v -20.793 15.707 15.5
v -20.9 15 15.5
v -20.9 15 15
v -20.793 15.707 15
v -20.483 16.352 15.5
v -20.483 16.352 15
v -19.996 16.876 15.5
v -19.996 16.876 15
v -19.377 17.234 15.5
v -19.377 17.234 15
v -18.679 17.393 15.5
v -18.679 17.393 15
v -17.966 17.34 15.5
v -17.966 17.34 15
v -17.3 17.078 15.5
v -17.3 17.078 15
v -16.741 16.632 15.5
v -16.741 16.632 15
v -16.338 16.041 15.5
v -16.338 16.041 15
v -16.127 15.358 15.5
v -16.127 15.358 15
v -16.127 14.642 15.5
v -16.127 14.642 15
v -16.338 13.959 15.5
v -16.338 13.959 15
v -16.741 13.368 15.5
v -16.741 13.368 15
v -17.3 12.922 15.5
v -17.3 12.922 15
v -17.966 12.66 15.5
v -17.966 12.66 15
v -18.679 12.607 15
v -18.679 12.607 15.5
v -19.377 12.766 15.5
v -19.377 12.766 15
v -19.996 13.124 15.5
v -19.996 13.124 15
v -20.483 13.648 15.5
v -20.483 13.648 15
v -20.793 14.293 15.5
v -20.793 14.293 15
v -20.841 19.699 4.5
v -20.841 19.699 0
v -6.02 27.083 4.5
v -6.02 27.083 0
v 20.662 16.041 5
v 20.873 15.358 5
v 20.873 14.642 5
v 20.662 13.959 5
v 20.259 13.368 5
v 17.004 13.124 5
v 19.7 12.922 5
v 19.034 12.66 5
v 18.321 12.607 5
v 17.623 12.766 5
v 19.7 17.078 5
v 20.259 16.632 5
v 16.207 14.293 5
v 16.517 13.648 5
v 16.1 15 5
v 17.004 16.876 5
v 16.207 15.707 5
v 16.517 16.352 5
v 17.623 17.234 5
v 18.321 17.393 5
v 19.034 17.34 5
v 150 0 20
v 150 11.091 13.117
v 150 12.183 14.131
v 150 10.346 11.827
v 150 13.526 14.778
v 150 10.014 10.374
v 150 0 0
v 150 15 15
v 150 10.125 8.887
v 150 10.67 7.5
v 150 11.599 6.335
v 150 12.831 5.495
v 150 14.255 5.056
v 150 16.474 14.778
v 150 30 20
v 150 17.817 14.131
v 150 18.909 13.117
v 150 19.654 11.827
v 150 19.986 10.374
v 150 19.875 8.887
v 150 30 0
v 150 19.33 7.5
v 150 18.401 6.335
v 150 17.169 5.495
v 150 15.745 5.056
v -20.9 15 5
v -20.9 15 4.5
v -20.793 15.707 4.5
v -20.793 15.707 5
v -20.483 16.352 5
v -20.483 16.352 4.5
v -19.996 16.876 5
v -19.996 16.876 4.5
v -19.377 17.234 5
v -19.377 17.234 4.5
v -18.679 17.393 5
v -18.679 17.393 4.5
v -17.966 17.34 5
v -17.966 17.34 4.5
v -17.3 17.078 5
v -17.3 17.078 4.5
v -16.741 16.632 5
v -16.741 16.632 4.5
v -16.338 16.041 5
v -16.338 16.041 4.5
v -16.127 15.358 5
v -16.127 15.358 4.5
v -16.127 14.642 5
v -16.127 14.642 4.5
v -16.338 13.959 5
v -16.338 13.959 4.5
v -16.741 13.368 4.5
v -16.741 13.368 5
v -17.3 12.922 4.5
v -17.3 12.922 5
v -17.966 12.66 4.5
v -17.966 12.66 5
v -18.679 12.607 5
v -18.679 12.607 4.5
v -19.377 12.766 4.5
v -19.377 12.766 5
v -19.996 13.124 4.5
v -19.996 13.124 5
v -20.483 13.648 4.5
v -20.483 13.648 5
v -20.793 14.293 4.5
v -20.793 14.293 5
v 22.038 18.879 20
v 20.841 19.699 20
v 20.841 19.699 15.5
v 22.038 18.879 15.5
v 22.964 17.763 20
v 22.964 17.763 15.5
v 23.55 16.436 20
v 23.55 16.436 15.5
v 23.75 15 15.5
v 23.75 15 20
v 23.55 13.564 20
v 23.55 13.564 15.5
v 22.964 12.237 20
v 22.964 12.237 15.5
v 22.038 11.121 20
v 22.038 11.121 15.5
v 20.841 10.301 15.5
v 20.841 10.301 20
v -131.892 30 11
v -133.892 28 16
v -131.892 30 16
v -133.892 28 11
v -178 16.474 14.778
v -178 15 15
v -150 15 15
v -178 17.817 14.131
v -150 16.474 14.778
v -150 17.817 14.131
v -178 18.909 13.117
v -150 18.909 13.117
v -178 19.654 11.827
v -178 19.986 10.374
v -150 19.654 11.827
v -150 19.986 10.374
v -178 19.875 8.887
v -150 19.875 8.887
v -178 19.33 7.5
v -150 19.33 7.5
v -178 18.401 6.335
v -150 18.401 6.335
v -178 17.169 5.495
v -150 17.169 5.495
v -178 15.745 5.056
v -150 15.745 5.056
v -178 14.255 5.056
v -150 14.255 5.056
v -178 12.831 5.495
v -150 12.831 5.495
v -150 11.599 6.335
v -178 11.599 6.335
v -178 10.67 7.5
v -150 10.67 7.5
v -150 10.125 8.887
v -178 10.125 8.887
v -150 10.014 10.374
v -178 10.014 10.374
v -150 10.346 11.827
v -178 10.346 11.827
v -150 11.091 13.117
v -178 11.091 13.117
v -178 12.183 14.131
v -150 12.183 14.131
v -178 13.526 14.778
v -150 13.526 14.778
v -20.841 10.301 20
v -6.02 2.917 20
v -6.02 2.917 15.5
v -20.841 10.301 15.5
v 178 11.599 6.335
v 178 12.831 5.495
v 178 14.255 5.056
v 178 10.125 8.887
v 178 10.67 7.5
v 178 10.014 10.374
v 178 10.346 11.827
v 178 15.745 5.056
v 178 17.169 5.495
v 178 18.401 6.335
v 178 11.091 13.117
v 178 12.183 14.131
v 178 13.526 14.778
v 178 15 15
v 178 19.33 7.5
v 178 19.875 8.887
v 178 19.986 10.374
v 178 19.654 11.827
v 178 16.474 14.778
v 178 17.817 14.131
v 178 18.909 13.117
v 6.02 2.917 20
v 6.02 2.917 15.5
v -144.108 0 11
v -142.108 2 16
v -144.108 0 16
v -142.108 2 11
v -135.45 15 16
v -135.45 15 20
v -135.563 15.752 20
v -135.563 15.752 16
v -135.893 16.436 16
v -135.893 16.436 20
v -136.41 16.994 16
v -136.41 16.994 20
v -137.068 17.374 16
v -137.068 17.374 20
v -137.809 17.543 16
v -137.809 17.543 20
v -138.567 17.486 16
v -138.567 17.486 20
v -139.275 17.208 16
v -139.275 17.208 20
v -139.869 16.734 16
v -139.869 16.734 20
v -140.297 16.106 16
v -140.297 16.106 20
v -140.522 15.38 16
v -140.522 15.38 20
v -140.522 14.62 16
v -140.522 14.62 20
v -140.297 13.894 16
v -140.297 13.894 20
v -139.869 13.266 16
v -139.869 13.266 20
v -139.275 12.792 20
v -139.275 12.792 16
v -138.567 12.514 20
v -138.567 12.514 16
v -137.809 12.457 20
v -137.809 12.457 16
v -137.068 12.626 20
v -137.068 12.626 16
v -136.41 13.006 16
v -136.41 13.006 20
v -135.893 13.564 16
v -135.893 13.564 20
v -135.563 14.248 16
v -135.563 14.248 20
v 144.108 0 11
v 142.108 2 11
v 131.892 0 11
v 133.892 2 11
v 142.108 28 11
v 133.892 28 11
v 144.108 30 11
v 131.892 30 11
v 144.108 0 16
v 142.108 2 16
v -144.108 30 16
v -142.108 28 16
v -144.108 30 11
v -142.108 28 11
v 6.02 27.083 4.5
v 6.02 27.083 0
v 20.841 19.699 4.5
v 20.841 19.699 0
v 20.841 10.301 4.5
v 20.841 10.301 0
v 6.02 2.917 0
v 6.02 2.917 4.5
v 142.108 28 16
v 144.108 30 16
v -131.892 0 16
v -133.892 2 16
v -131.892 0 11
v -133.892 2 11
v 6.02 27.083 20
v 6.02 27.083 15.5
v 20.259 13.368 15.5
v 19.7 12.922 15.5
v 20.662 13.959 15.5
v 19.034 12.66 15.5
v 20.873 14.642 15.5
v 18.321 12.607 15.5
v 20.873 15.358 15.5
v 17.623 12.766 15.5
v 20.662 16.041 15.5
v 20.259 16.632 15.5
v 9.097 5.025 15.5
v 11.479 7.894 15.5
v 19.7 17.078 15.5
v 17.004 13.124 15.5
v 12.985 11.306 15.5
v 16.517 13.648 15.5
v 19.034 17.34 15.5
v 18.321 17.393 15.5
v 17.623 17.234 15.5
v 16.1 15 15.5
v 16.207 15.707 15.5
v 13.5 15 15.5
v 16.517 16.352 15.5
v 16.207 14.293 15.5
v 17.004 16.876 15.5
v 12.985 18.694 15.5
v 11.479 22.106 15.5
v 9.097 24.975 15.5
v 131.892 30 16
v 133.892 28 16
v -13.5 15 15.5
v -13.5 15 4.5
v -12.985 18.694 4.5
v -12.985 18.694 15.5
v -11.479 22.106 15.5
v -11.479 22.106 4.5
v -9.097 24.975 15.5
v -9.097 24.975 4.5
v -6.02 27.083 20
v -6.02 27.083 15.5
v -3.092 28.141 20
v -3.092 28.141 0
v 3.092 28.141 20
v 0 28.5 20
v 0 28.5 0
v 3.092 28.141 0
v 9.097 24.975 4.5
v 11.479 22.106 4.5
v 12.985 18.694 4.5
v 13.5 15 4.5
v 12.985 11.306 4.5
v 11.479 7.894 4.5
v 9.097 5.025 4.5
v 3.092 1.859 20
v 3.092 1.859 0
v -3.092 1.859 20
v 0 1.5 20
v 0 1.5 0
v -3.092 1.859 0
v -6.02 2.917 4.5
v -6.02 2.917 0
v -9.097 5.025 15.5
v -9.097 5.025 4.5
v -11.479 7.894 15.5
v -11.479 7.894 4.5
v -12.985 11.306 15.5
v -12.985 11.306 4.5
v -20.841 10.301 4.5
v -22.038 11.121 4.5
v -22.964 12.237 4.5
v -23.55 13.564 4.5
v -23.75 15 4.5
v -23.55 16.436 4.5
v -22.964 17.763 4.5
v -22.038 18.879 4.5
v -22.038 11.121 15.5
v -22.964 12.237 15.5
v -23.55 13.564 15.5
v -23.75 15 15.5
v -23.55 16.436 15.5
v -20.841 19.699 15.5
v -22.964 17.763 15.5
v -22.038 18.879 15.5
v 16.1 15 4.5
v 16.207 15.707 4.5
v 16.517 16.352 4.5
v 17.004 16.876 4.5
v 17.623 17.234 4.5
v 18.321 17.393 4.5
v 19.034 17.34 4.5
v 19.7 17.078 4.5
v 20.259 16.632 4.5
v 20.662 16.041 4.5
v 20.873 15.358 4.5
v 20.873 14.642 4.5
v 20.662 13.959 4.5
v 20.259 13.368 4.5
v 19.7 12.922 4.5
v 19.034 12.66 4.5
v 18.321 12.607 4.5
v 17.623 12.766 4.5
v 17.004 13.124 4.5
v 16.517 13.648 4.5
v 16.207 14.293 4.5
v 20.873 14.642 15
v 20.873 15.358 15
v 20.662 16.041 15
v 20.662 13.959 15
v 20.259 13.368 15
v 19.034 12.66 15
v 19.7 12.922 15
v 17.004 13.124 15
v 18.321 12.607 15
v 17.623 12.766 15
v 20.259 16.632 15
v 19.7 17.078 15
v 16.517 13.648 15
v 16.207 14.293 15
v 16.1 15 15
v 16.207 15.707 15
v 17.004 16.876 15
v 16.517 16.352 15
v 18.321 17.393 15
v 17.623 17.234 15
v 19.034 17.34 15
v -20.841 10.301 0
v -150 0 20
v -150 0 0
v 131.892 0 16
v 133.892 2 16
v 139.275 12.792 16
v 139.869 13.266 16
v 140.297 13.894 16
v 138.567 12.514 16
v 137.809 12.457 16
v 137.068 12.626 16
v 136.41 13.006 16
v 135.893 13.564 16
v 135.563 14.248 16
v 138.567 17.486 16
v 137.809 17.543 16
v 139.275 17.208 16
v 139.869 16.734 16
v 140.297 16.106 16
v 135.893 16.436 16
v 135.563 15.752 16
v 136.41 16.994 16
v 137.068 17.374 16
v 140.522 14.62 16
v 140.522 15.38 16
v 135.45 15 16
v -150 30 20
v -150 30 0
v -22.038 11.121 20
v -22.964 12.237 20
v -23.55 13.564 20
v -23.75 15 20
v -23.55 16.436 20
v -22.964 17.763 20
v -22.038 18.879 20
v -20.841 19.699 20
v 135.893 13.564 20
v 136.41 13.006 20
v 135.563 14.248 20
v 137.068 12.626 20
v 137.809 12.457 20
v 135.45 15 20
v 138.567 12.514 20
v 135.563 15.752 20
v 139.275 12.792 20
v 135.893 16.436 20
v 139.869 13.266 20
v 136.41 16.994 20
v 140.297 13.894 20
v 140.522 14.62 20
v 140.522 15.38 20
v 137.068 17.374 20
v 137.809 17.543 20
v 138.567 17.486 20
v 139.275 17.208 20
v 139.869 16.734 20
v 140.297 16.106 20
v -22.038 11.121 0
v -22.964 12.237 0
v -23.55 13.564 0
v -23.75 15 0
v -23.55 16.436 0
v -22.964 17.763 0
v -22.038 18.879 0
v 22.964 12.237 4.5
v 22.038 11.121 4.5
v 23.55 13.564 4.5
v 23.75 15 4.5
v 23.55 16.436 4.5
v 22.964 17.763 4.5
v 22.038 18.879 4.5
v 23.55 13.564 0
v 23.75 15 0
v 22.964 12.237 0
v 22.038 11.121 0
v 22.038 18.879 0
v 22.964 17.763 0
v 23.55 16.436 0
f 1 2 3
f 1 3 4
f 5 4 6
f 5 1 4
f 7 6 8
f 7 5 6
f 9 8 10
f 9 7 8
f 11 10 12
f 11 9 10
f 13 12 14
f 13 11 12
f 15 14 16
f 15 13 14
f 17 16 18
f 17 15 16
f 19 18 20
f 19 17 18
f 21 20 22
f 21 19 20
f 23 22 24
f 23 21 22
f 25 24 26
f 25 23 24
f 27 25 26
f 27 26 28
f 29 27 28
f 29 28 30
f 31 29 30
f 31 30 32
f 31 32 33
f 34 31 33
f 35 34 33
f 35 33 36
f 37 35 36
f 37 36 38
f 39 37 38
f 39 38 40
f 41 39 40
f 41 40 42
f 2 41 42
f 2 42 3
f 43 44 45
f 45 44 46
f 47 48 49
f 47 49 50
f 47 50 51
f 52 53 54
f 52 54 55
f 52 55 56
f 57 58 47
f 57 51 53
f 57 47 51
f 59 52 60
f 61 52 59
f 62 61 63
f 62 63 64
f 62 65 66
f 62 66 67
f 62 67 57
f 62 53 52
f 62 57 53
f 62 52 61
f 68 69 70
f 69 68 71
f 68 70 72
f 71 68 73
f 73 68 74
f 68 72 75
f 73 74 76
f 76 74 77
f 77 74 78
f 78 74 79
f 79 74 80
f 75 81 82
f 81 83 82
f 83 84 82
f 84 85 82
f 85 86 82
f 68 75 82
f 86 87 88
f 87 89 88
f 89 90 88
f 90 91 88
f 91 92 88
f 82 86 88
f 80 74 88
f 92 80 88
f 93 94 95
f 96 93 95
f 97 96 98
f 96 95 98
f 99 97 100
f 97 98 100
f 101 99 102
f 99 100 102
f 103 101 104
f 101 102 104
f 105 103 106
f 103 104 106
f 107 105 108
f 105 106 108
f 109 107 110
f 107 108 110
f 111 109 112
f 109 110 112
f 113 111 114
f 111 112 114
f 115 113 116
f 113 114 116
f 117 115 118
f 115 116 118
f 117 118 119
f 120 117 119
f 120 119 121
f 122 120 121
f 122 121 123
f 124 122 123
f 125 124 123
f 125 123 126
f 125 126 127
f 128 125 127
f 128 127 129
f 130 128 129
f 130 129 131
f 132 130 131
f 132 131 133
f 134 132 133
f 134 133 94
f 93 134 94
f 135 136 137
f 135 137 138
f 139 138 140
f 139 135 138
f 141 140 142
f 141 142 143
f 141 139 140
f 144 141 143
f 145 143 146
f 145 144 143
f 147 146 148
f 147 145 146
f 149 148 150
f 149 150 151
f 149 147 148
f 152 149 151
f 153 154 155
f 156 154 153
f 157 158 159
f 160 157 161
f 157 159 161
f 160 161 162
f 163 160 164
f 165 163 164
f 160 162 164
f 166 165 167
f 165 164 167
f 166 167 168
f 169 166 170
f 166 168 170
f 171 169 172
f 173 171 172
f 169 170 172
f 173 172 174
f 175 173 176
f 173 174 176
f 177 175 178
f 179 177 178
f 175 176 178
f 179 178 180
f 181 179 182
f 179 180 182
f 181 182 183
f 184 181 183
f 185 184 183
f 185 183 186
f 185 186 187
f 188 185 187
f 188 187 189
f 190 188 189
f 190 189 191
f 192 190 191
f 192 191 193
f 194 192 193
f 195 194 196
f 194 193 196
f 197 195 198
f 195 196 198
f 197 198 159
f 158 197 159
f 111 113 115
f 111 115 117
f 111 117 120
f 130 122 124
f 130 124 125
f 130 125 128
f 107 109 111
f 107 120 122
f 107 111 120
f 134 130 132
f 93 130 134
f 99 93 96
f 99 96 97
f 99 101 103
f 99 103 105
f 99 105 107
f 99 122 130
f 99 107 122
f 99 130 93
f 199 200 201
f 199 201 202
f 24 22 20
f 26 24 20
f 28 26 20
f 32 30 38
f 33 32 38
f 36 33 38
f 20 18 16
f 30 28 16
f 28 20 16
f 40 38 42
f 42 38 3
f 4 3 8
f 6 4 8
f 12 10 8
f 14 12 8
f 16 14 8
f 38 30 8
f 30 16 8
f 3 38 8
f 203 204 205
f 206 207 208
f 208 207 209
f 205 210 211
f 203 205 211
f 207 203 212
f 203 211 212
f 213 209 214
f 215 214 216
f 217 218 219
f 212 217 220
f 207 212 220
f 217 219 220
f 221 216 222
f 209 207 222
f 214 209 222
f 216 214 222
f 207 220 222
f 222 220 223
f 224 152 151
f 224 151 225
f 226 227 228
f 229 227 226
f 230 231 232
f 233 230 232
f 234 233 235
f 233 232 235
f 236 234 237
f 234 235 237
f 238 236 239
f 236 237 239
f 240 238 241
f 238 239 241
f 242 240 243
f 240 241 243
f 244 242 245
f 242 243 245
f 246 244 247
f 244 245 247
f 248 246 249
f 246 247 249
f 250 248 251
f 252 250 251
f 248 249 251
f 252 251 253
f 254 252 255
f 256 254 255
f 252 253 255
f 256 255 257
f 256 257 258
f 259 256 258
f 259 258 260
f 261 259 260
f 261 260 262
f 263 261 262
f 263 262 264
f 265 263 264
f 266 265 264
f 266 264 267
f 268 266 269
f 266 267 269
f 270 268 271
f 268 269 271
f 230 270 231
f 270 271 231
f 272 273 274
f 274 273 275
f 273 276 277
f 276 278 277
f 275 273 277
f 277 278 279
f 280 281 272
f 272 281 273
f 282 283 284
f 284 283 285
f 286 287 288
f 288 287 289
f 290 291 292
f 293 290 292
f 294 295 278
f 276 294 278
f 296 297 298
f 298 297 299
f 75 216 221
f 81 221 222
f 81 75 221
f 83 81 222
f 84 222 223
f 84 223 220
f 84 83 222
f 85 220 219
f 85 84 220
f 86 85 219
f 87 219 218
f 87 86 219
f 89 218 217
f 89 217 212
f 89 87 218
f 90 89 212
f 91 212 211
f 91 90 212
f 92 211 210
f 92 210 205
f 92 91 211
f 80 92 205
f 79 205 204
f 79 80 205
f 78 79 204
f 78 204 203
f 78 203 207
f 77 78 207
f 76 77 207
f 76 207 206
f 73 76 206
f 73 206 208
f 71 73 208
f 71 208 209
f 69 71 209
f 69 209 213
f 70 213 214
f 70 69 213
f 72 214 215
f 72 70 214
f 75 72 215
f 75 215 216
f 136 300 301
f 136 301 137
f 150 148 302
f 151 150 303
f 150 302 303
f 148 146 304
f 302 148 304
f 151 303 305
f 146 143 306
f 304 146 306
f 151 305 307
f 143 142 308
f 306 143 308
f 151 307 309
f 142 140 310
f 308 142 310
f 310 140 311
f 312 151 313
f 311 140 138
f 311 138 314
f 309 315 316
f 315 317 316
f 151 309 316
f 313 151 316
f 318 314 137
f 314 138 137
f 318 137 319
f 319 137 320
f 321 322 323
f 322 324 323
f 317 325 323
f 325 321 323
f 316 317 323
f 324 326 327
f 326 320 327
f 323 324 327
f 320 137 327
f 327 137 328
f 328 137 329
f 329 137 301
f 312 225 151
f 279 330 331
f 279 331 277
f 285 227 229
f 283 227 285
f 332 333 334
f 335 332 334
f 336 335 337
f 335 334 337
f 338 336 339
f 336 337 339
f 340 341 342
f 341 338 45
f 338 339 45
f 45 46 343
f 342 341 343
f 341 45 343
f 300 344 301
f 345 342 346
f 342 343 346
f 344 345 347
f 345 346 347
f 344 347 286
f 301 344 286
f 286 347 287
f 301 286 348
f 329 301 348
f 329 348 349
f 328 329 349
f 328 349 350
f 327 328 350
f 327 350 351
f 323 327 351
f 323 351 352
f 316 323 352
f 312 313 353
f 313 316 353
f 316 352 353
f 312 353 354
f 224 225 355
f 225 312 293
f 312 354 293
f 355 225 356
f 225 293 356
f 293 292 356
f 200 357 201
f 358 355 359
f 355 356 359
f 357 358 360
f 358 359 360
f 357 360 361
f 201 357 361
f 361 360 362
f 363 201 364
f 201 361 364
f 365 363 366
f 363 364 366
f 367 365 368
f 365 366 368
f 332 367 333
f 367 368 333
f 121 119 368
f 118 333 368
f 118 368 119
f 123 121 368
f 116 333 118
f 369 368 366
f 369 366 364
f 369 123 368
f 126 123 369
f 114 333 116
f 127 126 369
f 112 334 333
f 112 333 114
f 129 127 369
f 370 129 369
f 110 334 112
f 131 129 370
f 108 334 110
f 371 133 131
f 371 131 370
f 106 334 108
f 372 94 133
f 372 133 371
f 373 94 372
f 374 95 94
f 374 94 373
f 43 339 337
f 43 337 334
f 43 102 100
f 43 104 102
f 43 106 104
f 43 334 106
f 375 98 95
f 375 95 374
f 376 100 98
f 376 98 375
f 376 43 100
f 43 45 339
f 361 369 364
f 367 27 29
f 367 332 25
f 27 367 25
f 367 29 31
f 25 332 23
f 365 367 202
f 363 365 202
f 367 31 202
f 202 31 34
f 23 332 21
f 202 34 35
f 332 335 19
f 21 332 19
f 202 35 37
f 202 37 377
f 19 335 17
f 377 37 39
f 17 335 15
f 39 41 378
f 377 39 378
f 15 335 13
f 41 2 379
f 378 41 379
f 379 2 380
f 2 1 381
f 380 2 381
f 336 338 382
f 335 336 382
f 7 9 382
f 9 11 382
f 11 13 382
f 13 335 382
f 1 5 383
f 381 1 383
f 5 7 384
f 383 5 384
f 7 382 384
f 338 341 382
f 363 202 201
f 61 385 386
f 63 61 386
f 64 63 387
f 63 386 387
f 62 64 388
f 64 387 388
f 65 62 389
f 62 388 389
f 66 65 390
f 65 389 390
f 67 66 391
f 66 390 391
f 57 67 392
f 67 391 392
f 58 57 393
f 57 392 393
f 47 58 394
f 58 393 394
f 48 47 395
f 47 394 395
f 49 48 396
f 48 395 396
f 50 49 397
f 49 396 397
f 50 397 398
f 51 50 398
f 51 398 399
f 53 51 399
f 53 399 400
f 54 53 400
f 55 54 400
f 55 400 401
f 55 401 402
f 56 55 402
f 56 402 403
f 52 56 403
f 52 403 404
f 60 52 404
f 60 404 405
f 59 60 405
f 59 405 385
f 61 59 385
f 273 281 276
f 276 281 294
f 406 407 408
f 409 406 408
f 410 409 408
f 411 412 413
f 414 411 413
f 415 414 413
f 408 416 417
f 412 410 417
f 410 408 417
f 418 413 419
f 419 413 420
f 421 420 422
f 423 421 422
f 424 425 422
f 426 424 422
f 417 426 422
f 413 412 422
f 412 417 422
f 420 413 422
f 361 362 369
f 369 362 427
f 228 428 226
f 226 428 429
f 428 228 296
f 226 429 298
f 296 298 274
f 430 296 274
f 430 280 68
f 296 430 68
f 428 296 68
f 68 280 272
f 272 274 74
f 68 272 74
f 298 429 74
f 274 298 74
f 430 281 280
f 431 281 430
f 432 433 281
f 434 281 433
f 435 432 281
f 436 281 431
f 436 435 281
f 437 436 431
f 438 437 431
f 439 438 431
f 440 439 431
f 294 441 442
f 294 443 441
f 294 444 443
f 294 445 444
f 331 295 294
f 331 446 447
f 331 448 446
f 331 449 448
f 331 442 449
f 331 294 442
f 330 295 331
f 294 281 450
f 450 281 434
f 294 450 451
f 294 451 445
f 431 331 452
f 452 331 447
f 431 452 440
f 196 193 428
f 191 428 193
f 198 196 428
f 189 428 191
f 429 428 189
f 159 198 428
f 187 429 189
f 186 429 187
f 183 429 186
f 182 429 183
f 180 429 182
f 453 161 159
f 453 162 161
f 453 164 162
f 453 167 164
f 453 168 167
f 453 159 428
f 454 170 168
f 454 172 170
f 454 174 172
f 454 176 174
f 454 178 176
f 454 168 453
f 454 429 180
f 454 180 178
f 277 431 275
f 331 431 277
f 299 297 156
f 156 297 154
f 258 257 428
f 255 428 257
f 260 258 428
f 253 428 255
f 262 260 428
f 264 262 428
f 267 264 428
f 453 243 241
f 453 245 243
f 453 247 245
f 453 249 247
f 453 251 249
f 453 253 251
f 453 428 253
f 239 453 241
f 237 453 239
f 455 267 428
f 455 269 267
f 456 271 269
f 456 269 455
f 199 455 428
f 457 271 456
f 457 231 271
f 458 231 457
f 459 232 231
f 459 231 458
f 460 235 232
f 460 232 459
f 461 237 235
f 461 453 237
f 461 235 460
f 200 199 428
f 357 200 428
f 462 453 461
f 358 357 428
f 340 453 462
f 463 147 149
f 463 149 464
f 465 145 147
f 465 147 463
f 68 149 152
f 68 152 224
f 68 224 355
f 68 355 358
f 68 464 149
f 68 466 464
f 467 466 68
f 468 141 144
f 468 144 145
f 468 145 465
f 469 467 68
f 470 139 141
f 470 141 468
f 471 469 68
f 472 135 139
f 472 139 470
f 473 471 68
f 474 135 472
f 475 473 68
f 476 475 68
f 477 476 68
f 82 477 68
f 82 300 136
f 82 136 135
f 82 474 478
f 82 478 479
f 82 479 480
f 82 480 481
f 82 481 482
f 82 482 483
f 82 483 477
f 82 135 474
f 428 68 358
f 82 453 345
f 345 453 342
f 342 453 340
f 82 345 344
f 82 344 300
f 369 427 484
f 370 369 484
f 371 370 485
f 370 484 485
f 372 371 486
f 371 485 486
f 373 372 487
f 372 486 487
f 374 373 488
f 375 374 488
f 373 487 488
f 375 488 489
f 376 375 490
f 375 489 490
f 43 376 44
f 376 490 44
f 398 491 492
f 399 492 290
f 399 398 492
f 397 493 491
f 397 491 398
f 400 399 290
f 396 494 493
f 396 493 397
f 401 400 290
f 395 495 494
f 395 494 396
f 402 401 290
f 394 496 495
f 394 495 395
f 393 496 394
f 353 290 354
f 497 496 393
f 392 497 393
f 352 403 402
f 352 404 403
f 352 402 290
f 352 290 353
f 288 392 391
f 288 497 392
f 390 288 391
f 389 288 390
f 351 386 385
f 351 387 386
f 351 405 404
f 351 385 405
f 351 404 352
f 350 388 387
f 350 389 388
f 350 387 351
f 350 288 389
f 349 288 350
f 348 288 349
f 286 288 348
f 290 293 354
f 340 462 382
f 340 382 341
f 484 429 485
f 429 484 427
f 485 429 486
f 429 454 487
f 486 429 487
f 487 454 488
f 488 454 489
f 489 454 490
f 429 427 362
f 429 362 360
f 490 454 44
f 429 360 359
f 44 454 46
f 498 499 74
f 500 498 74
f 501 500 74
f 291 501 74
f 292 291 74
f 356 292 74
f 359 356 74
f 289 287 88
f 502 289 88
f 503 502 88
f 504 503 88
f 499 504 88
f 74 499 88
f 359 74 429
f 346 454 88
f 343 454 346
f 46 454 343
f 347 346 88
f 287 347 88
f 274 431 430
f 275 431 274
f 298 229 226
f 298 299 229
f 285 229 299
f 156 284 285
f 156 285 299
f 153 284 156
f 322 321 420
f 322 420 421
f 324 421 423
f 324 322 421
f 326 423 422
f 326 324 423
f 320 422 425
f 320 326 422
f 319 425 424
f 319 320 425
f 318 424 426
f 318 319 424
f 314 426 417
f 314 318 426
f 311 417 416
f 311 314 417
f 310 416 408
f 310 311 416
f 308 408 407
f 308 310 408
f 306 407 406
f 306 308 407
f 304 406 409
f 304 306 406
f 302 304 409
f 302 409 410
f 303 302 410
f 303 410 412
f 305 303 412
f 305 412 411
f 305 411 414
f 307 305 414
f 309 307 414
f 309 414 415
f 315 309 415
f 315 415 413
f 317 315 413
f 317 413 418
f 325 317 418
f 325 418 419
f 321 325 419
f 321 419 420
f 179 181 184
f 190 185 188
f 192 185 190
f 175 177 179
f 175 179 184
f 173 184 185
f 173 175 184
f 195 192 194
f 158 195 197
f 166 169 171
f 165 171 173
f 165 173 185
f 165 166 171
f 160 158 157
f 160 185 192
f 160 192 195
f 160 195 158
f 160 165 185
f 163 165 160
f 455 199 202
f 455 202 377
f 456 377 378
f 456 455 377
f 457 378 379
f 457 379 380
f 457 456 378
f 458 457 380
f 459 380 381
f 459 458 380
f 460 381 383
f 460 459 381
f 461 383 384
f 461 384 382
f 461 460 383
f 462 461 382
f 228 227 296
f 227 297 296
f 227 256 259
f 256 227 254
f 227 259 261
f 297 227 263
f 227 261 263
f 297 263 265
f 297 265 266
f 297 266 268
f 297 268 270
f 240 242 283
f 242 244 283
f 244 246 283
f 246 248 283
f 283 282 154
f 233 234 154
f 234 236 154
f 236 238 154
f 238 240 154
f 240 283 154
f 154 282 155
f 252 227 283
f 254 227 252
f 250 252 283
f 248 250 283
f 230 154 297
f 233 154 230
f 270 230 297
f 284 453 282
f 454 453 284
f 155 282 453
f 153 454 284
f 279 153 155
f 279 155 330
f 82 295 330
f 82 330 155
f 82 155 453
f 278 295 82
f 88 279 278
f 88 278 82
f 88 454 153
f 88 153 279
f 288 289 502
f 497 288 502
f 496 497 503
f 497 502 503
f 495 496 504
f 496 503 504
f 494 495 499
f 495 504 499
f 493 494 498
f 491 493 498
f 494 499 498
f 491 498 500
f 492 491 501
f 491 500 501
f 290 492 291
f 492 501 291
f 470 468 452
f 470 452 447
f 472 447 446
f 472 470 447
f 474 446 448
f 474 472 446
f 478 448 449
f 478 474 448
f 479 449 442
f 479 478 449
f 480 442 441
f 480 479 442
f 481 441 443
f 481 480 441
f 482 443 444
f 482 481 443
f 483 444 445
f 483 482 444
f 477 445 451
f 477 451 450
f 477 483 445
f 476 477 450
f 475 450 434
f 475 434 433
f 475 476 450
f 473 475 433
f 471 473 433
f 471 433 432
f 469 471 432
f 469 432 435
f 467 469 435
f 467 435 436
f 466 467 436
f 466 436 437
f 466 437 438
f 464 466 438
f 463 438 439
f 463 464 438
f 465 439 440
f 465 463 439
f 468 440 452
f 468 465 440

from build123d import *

# Parameters (mm, degrees)
SKETCH_1_W                 = 300
SKETCH_1_H                 = 30
EXTRUDE_1_DEPTH            = 20
SKETCH_3_R                 = 4
CUT_EXTRUDE_1_DEPTH        = 155.272486205
SKETCH_3_3_R               = 6
SKETCH_3_3_R_2             = 4
CUT_EXTRUDE_2_DEPTH        = 155.272486205
SKETCH_3_4_R               = 13.5
SKETCH_3_4_R_2             = 6
CUT_EXTRUDE_3_DEPTH        = 155.272486205
SKETCH_3_5_R               = 2.4
CUT_EXTRUDE_4_DEPTH        = 4.5
SKETCH_3_6_R               = 2.4
CUT_EXTRUDE_5_DEPTH        = 5
SKETCH_4_R                 = 5
EXTRUDE_2_DEPTH            = 28
SKETCH_5_R                 = 2.55
CUT_EXTRUDE_6_DEPTH        = 4
SKETCH_6_W                 = 8.216991224
SKETCH_6_H                 = 30
CUT_EXTRUDE_7_DEPTH        = 5
CHAMFER_1_SIZE             = 2
CHAMFER_1_OF_MIRROR_2_SIZE = 2


with BuildPart() as part:
    # 草图1 → 凸台-拉伸1 (new body)
    with BuildSketch(Plane.XY):
        with Locations((0, 15)):
            Rectangle(SKETCH_1_W, SKETCH_1_H)
    extrude(amount=EXTRUDE_1_DEPTH)

    # 草图3 → 切除-拉伸1 (cut, through all)
    with BuildSketch(Plane(origin=(0, 0, 0), x_dir=(-1, 0, 0), z_dir=(0, 0, -1))):
        with Locations((0, 15)):
            Circle(SKETCH_3_R)
    extrude(amount=-CUT_EXTRUDE_1_DEPTH, mode=Mode.SUBTRACT)

    # 草图3<3> → 切除-拉伸2 (cut, through all)
    with BuildSketch(Plane(origin=(0, 0, 0), x_dir=(-1, 0, 0), z_dir=(0, 0, -1))):
        with Locations((0, 15)):
            Circle(SKETCH_3_3_R)
        with Locations((0, 15)):
            Circle(SKETCH_3_3_R_2, mode=Mode.SUBTRACT)
    extrude(amount=-CUT_EXTRUDE_2_DEPTH, mode=Mode.SUBTRACT)

    # 草图3<4> → 切除-拉伸3 (cut, through all)
    with BuildSketch(Plane(origin=(0, 0, 0), x_dir=(-1, 0, 0), z_dir=(0, 0, -1))):
        with Locations((0, 15)):
            Circle(SKETCH_3_4_R)
        with Locations((0, 15)):
            Circle(SKETCH_3_4_R_2, mode=Mode.SUBTRACT)
    extrude(amount=-CUT_EXTRUDE_3_DEPTH, mode=Mode.SUBTRACT)

    # 草图3<5> → 切除-拉伸4 (cut)
    # profile 1 of 2: a face of its own
    with BuildSketch(Plane(origin=(0, 0, 0), x_dir=(-1, 0, 0), z_dir=(0, 0, -1))):
        with BuildLine():
            ThreePointArc((-6.02027027, 2.916691435), (-13.5, 15), (-6.02027027, 27.083308565))
            Line((-6.02027027, 27.083308565), (-20.841216216, 19.699064442))
            ThreePointArc((-20.841216216, 19.699064442), (-23.75, 15), (-20.841216216, 10.300935558))
            Line((-20.841216216, 10.300935558), (-6.02027027, 2.916691435))
        make_face()
        with Locations((-18.5, 15)):
            Circle(SKETCH_3_5_R, mode=Mode.SUBTRACT)
    # profile 2 of 2: a face of its own
    with BuildSketch(Plane(origin=(0, 0, 0), x_dir=(-1, 0, 0), z_dir=(0, 0, -1))):
        with BuildLine():
            Line((20.841216216, 19.699064442), (6.02027027, 27.083308565))
            ThreePointArc((6.02027027, 27.083308565), (13.5, 15), (6.02027027, 2.916691435))
            Line((6.02027027, 2.916691435), (20.841216216, 10.300935558))
            ThreePointArc((20.841216216, 10.300935558), (23.75, 15), (20.841216216, 19.699064442))
        make_face()
        with Locations((18.5, 15)):
            Circle(SKETCH_3_5_R, mode=Mode.SUBTRACT)
    cut_extrude_4 = extrude(amount=-CUT_EXTRUDE_4_DEPTH, mode=Mode.SUBTRACT)

    # 草图3<6> → 切除-拉伸5 (cut)
    with BuildSketch(Plane(origin=(0, 0, 0), x_dir=(-1, 0, 0), z_dir=(0, 0, -1))):
        with Locations((18.5, 15)):
            Circle(SKETCH_3_6_R)
        with Locations((-18.5, 15)):
            Circle(SKETCH_3_6_R)
    cut_extrude_5 = extrude(amount=-CUT_EXTRUDE_5_DEPTH, mode=Mode.SUBTRACT)

    # 草图4 → 凸台-拉伸2 (add)
    with BuildSketch(Plane.ZY.offset(150)):
        with Locations((10, 15)):
            Circle(SKETCH_4_R)
    extrude_2 = extrude(amount=EXTRUDE_2_DEPTH)

    # 镜向1: 凸台-拉伸2 across plane
    add(extrude_2.mirror(Plane.ZY))

    # 草图5 → 切除-拉伸6 (cut)
    with BuildSketch(Plane.XY.offset(20)):
        with Locations((-138, 15)):
            Circle(SKETCH_5_R)
    cut_extrude_6 = extrude(amount=-CUT_EXTRUDE_6_DEPTH, mode=Mode.SUBTRACT)

    # 草图6 → 切除-拉伸7 (cut)
    with BuildSketch(Plane.XY.offset(16)):
        with Locations((-138, 15)):
            Rectangle(SKETCH_6_W, SKETCH_6_H)
    cut_extrude_7 = extrude(amount=-CUT_EXTRUDE_7_DEPTH, mode=Mode.SUBTRACT)

    # 倒角1
    chamfer_1_edges = [part.edges().sort_by_distance(p)[0] for p in [
        (-133.891504388, 0, 13.5),
        (-142.108495612, 0, 13.5),
        (-133.891504388, 30, 13.5),
        (-142.108495612, 30, 13.5),
    ]]
    chamfer(chamfer_1_edges, length=CHAMFER_1_SIZE)

    # 镜向2: 切除-拉伸6, 切除-拉伸7 across plane
    add(cut_extrude_6.mirror(Plane.ZY), mode=Mode.SUBTRACT)
    add(cut_extrude_7.mirror(Plane.ZY), mode=Mode.SUBTRACT)

    # 倒角1 of 镜向2
    chamfer_1_of_mirror_2_edges = [part.edges().sort_by_distance(p)[0] for p in [
        (133.891504388, 0, 13.5),
        (142.108495612, 0, 13.5),
        (133.891504388, 30, 13.5),
        (142.108495612, 30, 13.5),
    ]]
    chamfer(chamfer_1_of_mirror_2_edges, length=CHAMFER_1_OF_MIRROR_2_SIZE)

    # 镜向3: 切除-拉伸4, 切除-拉伸5 across plane
    add(cut_extrude_4.mirror(Plane.XY.offset(10)), mode=Mode.SUBTRACT)
    add(cut_extrude_5.mirror(Plane.XY.offset(10)), mode=Mode.SUBTRACT)


solid = part.part
